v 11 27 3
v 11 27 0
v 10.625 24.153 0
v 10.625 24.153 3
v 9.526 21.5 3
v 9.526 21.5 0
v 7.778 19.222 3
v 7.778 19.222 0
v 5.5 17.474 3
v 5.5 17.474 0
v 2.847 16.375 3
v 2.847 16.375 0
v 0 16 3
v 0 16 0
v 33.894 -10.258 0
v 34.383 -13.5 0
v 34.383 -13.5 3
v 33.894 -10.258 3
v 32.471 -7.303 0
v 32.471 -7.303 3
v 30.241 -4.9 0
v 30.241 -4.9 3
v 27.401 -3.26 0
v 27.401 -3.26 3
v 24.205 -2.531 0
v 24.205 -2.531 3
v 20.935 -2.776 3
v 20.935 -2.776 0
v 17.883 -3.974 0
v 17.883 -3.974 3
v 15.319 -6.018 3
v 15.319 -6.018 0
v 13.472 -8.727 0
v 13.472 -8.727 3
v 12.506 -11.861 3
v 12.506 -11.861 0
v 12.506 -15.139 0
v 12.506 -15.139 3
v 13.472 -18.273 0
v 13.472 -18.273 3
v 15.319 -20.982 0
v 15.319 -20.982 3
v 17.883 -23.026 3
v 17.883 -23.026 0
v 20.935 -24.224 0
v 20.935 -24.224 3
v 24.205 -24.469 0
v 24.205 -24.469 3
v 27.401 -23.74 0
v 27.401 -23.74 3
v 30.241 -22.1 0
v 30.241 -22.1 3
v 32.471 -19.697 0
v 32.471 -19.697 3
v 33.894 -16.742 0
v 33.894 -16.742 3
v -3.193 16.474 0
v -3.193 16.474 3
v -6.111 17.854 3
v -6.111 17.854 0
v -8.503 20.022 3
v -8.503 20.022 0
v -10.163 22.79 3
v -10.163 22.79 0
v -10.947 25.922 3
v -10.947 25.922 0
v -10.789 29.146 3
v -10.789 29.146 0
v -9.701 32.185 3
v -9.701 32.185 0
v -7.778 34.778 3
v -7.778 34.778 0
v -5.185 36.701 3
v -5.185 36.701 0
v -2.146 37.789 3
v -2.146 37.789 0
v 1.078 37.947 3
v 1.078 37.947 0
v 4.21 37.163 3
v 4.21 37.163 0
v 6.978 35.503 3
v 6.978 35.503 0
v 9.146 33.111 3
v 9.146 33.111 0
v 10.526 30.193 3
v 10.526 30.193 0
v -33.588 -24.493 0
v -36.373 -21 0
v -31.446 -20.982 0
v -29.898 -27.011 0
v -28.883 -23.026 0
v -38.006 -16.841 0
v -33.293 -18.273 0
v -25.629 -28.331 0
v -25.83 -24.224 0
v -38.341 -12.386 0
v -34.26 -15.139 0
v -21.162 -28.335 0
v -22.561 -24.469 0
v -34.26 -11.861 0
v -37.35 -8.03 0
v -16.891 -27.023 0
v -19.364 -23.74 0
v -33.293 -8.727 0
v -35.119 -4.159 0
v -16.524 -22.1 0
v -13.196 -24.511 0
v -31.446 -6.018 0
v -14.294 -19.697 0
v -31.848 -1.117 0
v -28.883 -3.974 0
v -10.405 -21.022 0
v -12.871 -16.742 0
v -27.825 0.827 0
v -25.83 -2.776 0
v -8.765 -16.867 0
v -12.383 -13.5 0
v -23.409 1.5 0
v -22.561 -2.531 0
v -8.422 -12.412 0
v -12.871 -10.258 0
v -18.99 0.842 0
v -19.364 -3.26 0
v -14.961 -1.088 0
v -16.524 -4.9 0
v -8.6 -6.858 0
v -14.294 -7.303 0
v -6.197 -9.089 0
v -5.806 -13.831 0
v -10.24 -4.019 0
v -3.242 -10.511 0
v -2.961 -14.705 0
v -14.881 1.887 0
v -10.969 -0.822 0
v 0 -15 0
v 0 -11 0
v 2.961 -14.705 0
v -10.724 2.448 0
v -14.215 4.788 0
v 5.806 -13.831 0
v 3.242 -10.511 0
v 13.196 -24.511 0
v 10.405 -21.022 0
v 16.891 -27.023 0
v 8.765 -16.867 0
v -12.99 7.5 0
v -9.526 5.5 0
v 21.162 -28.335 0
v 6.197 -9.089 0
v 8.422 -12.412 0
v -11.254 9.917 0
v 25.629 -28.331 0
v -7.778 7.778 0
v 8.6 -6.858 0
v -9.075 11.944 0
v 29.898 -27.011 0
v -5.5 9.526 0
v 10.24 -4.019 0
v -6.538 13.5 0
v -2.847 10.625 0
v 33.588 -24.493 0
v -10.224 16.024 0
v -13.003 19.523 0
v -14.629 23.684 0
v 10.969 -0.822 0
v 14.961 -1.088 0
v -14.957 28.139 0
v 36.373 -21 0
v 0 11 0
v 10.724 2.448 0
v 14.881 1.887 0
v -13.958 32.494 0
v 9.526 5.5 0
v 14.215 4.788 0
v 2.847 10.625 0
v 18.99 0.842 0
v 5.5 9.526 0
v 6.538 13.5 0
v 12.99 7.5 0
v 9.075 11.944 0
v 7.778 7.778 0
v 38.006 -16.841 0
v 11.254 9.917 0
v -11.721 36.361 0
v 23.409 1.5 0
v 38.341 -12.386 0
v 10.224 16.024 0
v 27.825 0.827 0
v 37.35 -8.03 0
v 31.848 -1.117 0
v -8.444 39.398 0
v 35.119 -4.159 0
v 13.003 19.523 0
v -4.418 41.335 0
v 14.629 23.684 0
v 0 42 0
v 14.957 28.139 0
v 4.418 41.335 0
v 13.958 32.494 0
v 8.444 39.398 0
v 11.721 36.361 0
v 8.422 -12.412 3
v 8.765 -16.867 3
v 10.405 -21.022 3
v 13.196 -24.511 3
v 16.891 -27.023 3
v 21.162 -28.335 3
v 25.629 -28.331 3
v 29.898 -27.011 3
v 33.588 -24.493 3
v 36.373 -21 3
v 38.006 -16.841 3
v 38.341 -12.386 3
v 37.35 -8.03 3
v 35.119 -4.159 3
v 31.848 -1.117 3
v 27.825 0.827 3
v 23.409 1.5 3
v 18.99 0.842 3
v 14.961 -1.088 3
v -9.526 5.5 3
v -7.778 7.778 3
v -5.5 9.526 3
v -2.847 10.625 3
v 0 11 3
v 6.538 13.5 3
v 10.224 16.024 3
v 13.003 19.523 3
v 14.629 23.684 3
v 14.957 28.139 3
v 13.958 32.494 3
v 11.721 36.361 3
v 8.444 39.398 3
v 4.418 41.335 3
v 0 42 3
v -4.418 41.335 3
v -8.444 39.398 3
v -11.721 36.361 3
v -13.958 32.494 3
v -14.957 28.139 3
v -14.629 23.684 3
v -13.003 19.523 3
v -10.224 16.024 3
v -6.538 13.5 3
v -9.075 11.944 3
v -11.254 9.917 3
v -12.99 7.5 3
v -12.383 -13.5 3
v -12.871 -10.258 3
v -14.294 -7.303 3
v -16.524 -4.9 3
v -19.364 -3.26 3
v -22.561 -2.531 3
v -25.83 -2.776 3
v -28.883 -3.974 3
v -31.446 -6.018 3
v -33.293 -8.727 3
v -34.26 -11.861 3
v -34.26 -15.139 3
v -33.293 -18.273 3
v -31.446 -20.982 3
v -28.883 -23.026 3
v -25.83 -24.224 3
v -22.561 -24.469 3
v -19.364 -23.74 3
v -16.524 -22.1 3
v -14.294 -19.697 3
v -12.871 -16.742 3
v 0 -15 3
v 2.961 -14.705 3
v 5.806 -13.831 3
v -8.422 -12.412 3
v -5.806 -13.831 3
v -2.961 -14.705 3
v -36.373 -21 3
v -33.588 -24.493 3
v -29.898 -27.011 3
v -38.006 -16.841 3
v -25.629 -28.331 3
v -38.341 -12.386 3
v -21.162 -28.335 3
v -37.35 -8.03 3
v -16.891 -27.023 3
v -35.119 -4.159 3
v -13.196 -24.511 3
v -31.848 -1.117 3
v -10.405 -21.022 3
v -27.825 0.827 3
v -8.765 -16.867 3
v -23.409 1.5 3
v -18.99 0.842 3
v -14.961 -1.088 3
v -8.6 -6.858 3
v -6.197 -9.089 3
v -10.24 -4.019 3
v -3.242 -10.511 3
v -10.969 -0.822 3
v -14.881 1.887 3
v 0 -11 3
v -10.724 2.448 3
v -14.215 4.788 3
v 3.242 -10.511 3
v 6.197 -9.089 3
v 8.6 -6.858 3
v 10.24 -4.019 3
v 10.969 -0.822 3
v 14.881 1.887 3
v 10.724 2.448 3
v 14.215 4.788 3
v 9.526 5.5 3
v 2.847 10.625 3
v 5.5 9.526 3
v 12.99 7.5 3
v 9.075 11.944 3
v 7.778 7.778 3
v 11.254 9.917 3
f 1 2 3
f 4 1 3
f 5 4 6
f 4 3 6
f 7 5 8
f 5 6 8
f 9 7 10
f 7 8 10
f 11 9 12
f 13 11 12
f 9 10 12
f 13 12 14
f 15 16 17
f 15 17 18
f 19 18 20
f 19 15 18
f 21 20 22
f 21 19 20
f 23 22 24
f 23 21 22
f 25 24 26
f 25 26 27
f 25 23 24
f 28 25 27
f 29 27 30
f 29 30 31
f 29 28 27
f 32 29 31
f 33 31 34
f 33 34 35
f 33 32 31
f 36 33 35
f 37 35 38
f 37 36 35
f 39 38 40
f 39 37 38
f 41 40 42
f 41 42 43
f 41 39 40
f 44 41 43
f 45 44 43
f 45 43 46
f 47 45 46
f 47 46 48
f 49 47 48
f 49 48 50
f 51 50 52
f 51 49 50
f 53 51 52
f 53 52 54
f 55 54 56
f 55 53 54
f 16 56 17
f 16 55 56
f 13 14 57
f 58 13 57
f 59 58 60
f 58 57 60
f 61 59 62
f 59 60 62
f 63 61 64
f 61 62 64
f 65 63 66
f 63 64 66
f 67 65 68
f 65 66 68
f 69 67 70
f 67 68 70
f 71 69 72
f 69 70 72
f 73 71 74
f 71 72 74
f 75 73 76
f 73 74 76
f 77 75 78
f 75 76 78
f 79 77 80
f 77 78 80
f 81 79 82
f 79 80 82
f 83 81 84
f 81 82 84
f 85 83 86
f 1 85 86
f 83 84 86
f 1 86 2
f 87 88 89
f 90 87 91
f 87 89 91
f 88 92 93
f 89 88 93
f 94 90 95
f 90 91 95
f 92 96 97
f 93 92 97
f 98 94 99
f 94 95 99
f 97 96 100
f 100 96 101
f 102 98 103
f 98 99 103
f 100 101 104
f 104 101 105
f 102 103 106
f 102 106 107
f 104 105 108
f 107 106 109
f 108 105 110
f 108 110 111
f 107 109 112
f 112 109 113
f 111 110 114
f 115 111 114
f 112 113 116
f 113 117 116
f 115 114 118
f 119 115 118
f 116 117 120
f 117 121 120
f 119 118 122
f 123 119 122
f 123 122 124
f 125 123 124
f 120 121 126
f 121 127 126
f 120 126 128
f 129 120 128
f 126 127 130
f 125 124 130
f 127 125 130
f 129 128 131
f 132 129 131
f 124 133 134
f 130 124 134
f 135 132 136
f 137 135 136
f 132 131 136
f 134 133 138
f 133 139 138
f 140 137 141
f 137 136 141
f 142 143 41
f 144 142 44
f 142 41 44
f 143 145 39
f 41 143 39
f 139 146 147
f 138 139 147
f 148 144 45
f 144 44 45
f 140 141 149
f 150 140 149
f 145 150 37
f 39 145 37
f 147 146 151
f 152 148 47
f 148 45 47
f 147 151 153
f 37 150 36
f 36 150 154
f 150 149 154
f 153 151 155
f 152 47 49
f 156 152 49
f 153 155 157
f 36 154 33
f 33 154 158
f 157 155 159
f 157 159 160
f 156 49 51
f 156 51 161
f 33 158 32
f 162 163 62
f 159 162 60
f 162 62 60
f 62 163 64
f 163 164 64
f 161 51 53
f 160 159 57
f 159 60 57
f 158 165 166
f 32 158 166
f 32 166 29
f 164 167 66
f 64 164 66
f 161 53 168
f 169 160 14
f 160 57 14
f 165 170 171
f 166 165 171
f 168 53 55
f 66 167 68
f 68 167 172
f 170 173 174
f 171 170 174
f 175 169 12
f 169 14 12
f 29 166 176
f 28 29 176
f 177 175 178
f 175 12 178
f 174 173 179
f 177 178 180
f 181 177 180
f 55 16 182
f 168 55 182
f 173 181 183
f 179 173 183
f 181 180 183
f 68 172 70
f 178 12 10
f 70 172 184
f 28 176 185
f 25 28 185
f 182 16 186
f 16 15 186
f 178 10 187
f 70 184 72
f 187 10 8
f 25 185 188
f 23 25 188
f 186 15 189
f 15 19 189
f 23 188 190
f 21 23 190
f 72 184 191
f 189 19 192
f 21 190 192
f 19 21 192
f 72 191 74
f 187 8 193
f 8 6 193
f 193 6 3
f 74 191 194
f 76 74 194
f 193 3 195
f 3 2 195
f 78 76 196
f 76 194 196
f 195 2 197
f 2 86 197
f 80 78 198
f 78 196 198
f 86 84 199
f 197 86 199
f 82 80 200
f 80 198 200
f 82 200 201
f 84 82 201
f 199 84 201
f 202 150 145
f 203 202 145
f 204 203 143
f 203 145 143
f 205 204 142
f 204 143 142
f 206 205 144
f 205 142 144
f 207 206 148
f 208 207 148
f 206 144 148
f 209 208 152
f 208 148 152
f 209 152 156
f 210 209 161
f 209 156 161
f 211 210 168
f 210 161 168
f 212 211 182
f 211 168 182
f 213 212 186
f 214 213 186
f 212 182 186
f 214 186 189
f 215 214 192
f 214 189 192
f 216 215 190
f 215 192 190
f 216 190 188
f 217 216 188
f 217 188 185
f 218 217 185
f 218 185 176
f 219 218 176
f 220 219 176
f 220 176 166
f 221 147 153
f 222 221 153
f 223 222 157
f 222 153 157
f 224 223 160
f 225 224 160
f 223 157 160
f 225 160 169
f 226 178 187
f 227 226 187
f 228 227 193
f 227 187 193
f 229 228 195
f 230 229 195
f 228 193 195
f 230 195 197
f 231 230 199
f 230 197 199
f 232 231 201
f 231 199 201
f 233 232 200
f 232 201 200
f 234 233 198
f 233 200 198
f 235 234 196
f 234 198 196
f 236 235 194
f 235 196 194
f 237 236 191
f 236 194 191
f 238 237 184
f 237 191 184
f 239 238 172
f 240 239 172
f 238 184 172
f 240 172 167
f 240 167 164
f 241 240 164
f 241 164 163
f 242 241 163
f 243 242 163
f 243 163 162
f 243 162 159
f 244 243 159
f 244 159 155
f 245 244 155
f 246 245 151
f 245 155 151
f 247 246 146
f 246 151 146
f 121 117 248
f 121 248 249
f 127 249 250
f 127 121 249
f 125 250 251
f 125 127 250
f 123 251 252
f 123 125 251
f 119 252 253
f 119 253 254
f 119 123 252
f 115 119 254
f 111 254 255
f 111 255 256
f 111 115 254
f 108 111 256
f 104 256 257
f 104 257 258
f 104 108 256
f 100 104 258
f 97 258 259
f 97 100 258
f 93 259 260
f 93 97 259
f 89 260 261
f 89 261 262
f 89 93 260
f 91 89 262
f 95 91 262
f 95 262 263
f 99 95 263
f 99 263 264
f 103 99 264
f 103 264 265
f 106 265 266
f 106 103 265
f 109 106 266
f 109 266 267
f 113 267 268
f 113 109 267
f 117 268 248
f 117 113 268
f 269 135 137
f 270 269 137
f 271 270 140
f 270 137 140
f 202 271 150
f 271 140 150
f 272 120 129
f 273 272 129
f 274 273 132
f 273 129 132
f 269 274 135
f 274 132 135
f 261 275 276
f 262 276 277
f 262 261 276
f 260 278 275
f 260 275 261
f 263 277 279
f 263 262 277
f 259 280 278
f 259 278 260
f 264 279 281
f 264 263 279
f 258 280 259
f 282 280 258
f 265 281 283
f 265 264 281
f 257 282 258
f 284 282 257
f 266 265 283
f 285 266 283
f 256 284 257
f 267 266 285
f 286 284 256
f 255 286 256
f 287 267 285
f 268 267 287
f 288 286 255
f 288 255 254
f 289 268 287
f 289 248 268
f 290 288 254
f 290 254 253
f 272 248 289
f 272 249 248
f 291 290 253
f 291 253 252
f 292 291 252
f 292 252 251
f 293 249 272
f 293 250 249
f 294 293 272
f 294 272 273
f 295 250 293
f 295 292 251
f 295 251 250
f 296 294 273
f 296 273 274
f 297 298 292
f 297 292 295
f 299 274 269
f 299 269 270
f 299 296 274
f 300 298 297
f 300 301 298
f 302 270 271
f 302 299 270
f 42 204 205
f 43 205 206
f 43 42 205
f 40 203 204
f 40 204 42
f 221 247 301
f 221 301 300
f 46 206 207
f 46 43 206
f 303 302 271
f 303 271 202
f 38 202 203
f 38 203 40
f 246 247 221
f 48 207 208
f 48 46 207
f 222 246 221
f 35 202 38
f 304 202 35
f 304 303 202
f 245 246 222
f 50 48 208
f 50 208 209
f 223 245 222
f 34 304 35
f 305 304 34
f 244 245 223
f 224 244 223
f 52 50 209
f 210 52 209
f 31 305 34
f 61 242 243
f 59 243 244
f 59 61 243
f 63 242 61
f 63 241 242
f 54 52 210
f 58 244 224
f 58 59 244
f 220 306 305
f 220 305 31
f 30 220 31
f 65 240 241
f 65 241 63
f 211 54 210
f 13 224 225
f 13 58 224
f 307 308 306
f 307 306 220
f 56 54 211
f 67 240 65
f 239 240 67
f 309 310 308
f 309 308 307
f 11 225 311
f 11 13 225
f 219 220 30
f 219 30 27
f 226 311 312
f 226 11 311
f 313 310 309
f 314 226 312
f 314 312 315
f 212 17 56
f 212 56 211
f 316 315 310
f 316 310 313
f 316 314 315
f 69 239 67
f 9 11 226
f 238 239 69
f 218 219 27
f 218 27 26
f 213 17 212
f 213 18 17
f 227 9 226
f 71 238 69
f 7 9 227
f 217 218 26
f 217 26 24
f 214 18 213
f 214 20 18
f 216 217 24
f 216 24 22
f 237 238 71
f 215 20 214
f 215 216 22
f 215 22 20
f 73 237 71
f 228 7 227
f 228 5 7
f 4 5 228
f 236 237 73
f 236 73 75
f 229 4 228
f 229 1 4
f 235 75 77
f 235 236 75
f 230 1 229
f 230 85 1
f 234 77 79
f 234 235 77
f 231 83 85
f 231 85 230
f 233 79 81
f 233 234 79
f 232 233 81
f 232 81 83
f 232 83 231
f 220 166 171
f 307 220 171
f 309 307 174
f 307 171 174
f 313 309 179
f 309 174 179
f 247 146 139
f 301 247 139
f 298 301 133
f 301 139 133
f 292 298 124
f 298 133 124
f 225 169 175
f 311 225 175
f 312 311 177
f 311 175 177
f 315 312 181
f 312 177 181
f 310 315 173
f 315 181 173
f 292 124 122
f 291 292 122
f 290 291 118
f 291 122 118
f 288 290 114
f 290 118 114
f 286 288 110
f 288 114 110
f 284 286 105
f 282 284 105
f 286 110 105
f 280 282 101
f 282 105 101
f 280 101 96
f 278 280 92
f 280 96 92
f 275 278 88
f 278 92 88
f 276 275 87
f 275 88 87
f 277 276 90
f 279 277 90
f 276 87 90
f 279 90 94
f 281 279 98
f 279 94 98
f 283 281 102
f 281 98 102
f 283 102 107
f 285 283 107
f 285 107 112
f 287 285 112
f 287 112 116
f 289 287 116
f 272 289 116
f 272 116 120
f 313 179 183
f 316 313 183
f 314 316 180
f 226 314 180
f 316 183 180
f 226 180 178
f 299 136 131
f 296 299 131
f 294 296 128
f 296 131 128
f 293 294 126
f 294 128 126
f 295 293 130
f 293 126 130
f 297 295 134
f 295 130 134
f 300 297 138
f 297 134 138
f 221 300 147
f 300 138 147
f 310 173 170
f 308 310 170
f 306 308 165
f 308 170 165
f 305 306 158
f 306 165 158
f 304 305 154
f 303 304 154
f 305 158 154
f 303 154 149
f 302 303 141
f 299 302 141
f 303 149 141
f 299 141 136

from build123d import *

# Parameters (mm, degrees)
F0_R     = 11
F1_DEPTH = 3


with BuildPart() as f1:
    # F0 (on Top) → F1 (new body)
    with BuildSketch(Plane.XY):
        with BuildLine():
            ThreePointArc((0, -11), (9.526279, -5.5), (9.526279, 5.5))
            ThreePointArc((9.526279, 5.5), (5.5, 9.526279), (0, 11))
            ThreePointArc((0, 11), (-5.5, 9.526279), (-9.526279, 5.5))
            ThreePointArc((-9.526279, 5.5), (-9.526279, -5.5), (0, -11))
        make_face()
        with BuildLine():
            ThreePointArc((11, 27), (-7.778175, 34.778175), (0, 16))
            ThreePointArc((0, 16), (7.778175, 19.221825), (11, 27))
        make_face()
        with BuildLine():
            ThreePointArc((14.960517, -1.087624), (14.620192, 3.354102), (12.990381, 7.5))
            ThreePointArc((12.990381, 7.5), (10.214833, 10.984406), (6.538348, 13.5))
            ThreePointArc((6.538348, 13.5), (0, 42), (-6.538348, 13.5))
            ThreePointArc((-6.538348, 13.5), (-10.214833, 10.984406), (-12.990381, 7.5))
            ThreePointArc((-12.990381, 7.5), (-14.620192, 3.354102), (-14.960517, -1.087624))
            ThreePointArc((-14.960517, -1.087624), (-36.373067, -21), (-8.422169, -12.412376))
            ThreePointArc((-8.422169, -12.412376), (-4.405358, -14.338508), (0, -15))
            ThreePointArc((0, -15), (4.405358, -14.338508), (8.422169, -12.412376))
            ThreePointArc((8.422169, -12.412376), (36.373067, -21), (14.960517, -1.087624))
        make_face()
        with Locations((-23.382686, -13.5)):
            Circle(F0_R, mode=Mode.SUBTRACT)
        with Locations((23.382686, -13.5)):
            Circle(F0_R, mode=Mode.SUBTRACT)
        with BuildLine():
            ThreePointArc((0, 11), (5.5, 9.526279), (9.526279, 5.5))
            ThreePointArc((9.526279, 5.5), (9.526279, -5.5), (0, -11))
            ThreePointArc((0, -11), (-9.526279, -5.5), (-9.526279, 5.5))
            ThreePointArc((-9.526279, 5.5), (-5.5, 9.526279), (0, 11))
        make_face(mode=Mode.SUBTRACT)
        with BuildLine():
            ThreePointArc((11, 27), (7.778175, 19.221825), (0, 16))
            ThreePointArc((0, 16), (-7.778175, 34.778175), (11, 27))
        make_face(mode=Mode.SUBTRACT)
    extrude(amount=F1_DEPTH)


solid = f1.part
